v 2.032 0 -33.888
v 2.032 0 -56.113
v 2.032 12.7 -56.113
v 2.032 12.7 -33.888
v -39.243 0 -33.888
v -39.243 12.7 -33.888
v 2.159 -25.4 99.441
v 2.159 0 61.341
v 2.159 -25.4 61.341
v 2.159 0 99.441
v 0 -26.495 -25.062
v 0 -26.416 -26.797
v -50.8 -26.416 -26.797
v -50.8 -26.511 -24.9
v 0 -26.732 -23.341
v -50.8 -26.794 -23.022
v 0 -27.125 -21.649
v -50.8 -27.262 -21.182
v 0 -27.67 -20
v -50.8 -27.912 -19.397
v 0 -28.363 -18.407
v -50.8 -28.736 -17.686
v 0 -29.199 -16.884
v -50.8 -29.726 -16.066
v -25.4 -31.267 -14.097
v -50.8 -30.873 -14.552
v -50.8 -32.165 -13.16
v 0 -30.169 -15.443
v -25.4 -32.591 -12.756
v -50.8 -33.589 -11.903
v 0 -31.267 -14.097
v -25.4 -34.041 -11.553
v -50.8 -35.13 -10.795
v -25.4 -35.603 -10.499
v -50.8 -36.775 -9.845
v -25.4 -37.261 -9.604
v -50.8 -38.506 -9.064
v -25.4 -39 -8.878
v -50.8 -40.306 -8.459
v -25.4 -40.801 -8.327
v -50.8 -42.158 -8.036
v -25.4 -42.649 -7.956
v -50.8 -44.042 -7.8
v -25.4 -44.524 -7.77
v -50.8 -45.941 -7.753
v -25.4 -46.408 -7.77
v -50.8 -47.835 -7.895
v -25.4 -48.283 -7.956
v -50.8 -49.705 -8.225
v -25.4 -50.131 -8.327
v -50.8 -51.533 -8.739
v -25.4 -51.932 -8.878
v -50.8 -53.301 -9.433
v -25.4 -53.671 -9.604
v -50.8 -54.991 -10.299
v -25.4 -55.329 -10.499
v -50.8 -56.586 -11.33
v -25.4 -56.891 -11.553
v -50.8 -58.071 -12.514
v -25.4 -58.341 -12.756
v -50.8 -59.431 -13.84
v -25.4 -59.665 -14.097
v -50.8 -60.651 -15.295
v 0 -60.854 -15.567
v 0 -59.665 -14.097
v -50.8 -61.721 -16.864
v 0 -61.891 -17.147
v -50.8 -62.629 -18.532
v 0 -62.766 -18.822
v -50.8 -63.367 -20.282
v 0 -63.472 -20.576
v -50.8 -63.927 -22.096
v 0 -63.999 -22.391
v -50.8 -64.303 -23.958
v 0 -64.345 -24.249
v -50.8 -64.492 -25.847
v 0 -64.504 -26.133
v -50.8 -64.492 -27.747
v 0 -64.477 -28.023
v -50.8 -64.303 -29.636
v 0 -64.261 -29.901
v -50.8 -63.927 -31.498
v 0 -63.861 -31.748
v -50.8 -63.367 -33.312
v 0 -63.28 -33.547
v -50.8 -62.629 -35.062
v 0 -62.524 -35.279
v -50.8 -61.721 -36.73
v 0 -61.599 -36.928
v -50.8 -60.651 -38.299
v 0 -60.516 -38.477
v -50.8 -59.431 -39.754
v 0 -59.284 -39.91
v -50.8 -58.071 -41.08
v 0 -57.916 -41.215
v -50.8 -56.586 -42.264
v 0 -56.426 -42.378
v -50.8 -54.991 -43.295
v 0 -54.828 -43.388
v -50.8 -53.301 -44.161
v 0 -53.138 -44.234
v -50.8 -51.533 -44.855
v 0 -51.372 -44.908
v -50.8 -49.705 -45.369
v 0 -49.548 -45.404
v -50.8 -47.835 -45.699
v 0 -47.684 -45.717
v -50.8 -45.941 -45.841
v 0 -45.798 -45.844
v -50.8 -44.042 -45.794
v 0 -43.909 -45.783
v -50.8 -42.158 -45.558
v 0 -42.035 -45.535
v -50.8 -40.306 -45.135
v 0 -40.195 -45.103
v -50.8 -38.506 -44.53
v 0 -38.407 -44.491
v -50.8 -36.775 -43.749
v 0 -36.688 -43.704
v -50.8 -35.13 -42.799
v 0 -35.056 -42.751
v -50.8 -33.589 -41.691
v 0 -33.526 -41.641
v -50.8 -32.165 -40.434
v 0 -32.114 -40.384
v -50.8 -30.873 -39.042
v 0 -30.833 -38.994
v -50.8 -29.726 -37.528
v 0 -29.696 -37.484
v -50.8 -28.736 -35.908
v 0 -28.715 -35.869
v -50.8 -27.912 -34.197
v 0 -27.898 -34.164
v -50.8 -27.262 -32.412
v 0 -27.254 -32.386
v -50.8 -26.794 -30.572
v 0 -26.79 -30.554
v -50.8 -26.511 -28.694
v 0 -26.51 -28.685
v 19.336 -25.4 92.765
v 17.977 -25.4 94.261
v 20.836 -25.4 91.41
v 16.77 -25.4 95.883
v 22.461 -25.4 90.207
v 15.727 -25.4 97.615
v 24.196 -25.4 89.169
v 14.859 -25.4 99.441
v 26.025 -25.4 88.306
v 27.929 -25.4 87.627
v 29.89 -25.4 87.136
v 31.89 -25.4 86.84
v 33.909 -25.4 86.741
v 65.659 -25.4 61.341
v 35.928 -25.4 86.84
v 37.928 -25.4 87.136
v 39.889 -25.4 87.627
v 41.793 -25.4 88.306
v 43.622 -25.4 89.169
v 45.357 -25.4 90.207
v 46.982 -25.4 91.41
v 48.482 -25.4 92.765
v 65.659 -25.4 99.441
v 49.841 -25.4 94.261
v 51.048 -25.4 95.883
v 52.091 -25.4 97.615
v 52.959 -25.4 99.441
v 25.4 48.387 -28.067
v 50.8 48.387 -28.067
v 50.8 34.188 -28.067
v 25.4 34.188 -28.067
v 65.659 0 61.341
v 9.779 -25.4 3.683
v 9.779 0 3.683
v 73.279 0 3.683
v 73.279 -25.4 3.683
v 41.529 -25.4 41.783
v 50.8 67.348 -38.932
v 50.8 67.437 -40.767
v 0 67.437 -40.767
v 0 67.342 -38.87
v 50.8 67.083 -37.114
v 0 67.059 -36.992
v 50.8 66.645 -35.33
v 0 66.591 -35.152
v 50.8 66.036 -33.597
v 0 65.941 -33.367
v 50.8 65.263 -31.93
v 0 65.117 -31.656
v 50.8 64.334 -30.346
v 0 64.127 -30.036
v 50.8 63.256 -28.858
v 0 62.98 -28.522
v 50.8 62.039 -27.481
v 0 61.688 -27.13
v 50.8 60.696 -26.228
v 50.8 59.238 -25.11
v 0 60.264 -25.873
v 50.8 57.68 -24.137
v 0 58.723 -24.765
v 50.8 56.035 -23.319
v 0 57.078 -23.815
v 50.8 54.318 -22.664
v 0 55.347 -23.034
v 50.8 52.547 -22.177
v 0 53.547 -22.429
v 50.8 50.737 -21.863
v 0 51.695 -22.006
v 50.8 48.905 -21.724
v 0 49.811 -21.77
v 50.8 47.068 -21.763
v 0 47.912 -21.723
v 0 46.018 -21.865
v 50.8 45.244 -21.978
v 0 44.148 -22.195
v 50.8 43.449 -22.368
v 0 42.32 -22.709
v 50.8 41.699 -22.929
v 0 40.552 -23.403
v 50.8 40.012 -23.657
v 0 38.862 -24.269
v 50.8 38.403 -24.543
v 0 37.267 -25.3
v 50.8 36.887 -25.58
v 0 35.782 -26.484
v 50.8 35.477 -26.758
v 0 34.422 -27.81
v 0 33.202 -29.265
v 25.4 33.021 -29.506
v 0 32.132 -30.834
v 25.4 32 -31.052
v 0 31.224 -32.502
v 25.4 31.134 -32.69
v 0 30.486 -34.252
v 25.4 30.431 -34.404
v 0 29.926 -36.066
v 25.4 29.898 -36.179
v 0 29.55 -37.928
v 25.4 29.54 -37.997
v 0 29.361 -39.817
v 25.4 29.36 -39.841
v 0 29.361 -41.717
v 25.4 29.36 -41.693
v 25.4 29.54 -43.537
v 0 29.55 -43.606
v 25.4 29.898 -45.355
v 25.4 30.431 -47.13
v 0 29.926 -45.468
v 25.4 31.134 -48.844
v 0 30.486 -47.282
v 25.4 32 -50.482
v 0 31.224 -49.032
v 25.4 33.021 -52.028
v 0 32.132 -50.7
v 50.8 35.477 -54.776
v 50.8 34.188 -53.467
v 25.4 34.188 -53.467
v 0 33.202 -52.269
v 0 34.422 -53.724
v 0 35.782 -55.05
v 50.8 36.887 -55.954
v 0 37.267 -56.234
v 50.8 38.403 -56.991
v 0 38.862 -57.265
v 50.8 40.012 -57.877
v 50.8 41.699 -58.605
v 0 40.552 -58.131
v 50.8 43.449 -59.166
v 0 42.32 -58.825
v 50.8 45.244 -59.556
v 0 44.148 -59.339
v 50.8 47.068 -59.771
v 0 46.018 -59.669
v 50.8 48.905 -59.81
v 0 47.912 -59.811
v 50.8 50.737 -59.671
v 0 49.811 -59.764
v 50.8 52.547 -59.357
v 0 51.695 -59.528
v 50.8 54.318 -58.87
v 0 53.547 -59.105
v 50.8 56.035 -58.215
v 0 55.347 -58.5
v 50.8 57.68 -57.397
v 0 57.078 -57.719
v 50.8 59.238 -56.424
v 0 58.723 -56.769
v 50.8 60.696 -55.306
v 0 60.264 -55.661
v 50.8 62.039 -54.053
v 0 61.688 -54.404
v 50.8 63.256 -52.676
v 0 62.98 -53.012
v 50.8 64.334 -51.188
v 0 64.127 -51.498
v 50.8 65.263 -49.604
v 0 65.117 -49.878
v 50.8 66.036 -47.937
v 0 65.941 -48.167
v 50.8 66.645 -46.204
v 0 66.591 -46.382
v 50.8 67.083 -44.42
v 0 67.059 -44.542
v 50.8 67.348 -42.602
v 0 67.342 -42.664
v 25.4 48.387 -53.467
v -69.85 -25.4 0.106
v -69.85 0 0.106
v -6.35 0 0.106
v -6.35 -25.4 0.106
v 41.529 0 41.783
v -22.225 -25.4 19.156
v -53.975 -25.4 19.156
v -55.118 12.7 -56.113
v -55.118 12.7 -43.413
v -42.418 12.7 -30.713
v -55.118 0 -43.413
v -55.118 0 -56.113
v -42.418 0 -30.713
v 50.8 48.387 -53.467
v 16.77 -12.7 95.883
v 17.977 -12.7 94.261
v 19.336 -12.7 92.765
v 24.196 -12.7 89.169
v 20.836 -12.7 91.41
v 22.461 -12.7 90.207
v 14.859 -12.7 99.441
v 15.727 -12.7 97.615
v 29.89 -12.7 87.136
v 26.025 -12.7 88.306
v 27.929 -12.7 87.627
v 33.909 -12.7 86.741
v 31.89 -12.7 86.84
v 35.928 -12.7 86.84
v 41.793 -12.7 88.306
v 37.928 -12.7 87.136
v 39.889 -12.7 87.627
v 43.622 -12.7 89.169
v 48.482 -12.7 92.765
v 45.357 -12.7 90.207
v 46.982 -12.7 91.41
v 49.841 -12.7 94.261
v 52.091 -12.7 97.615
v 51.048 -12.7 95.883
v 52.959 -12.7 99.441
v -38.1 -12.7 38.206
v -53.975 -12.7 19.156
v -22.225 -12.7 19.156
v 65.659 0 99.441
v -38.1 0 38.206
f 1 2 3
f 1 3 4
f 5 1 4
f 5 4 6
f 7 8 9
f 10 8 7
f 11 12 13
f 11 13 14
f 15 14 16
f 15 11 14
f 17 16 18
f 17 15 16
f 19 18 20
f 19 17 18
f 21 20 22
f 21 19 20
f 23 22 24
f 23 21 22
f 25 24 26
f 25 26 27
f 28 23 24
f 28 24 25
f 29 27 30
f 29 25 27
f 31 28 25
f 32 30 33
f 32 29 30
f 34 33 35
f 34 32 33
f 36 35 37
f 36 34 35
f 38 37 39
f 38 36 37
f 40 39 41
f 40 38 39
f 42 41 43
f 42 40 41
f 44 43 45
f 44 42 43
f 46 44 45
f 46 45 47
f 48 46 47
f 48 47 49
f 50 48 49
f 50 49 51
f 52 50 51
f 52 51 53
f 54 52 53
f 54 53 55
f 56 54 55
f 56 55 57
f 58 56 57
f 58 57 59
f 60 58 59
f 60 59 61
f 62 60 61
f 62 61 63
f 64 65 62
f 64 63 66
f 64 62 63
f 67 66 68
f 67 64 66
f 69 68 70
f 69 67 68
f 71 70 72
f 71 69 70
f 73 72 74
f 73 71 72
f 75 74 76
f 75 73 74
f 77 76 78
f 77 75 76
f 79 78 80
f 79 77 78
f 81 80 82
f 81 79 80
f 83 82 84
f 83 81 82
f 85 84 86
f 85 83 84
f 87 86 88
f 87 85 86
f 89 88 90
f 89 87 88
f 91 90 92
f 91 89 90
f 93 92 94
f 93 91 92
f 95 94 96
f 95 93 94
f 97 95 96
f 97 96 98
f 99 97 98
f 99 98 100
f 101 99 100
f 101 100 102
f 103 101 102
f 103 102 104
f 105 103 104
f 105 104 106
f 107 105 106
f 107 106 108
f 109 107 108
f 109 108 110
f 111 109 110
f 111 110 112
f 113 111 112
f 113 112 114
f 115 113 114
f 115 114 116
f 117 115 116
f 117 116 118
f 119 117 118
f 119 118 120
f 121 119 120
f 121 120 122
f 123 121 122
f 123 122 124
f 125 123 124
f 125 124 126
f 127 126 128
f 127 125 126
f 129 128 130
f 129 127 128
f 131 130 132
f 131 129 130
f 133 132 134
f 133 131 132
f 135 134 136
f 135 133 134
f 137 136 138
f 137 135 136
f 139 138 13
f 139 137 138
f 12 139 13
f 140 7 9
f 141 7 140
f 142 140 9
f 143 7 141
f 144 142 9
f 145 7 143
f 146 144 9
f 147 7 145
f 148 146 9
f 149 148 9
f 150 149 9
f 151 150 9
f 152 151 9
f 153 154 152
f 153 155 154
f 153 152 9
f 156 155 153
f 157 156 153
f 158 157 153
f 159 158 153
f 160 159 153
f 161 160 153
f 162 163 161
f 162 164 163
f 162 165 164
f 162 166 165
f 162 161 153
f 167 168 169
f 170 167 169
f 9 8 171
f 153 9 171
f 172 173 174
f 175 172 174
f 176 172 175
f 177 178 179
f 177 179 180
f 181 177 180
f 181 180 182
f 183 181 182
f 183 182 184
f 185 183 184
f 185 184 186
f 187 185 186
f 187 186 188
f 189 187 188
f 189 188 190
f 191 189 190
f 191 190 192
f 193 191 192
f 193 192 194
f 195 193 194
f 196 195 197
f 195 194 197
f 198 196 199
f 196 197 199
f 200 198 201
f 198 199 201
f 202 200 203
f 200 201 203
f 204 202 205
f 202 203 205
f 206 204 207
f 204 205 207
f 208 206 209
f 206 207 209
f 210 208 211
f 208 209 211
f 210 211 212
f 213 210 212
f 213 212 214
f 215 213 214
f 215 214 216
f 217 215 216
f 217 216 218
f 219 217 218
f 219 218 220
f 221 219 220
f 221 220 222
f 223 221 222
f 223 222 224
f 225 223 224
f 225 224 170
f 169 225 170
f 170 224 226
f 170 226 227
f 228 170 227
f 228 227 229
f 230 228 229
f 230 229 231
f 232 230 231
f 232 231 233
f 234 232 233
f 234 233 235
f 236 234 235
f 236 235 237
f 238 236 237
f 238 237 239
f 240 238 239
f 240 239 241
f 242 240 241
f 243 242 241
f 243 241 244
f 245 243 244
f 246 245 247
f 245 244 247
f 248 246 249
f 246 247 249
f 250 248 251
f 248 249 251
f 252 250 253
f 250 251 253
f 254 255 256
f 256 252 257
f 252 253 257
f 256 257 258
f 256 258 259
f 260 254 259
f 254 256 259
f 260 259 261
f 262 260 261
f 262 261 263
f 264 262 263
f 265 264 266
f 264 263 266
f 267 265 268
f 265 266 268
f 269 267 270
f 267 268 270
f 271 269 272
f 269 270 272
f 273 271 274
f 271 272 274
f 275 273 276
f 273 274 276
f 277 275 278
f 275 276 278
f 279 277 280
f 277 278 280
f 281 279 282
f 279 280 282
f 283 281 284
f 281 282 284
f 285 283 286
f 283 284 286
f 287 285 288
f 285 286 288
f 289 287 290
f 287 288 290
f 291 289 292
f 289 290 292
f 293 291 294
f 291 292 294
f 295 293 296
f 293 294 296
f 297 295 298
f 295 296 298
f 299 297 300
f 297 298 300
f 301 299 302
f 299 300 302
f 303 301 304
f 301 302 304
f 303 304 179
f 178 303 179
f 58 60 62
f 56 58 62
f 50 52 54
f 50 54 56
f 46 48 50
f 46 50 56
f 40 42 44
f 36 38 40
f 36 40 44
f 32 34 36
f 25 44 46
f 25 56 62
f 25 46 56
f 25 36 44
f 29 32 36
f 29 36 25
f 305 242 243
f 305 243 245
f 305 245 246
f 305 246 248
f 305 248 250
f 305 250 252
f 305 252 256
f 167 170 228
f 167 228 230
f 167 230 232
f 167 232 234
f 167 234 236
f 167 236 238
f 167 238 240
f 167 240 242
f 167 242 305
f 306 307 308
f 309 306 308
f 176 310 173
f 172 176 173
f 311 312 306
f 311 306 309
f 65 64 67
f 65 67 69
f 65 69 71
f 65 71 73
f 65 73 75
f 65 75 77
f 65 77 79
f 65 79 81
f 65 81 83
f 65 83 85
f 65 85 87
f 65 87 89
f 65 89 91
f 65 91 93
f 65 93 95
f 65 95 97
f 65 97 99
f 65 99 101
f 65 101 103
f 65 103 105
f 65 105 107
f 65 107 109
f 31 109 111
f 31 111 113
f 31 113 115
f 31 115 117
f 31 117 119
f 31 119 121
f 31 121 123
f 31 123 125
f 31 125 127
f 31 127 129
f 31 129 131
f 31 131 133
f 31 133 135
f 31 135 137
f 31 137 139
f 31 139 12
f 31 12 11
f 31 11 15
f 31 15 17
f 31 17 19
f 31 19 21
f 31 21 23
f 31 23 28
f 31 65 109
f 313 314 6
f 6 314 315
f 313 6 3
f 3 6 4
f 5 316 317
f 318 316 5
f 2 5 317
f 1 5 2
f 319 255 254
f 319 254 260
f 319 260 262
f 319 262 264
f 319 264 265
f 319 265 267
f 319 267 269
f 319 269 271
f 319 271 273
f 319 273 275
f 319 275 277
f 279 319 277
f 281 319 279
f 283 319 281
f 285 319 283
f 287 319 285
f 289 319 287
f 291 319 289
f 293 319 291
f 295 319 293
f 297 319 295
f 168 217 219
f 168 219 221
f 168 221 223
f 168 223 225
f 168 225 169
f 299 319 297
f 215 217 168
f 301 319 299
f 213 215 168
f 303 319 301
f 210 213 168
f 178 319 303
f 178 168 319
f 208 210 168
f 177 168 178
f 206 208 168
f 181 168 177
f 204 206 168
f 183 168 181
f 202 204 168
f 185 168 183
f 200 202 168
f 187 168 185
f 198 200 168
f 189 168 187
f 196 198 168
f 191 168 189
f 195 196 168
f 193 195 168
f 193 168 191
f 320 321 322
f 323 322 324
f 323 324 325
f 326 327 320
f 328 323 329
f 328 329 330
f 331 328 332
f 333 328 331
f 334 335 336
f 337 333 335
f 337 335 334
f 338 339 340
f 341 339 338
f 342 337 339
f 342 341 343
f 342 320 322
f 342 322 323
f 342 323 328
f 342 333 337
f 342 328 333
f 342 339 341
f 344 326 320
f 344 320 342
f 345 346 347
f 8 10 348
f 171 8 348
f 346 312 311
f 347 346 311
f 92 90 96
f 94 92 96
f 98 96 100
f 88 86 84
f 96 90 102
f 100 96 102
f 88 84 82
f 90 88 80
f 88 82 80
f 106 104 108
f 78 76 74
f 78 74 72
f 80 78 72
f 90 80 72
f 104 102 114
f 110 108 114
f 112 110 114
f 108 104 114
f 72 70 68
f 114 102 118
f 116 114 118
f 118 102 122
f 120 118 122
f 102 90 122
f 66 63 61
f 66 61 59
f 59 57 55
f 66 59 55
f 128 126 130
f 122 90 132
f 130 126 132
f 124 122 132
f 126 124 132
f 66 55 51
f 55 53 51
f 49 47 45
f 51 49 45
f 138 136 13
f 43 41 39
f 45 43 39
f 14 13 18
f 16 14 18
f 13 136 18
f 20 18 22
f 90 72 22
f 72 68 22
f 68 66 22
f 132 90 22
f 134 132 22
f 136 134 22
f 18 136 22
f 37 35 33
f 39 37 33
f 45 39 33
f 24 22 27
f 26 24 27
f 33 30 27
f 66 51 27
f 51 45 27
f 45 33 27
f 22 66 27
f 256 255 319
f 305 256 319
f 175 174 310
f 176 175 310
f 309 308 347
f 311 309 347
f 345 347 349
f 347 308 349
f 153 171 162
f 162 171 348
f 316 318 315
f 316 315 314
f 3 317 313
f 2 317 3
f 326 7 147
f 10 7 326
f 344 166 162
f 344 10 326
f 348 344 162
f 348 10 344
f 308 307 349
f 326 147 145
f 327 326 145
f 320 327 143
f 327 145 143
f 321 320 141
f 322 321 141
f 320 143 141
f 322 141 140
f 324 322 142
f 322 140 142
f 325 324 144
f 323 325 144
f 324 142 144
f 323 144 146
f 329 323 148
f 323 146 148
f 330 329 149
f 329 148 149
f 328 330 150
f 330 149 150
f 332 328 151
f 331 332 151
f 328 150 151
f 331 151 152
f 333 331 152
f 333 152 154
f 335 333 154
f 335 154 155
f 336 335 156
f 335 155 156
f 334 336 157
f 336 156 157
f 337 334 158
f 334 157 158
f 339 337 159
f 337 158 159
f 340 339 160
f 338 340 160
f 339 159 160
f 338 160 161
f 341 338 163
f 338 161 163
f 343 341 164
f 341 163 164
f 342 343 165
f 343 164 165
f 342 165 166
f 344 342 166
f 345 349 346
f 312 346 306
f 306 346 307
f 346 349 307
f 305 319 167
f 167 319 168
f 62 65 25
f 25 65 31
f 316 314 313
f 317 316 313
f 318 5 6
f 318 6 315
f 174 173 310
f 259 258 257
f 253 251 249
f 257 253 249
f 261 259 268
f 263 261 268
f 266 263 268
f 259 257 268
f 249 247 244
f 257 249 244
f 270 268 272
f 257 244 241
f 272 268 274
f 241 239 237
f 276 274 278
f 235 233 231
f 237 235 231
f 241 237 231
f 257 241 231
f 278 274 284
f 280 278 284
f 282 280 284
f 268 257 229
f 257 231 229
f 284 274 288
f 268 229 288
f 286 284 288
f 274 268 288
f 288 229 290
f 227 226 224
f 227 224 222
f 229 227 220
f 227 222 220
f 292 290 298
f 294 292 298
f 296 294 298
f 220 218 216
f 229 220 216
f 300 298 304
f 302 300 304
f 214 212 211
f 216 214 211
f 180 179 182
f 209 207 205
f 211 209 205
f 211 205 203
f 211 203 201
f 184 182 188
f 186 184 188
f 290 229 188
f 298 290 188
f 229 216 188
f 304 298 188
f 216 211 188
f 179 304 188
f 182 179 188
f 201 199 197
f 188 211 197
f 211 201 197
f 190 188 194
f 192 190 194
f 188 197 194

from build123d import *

# Parameters (mm, degrees)
F1_DEPTH  = 25.4
F3_DEPTH  = 12.7
F5_DEPTH  = 25.4
F6_W      = 31.75
F6_H      = 12.7
F7_DEPTH  = 12.7
F8_R      = 19.05
F9_DEPTH  = 50.8
F11_DEPTH = 25.4
F12_R     = 19.05
F13_DEPTH = 50.8
F15_DEPTH = 25.4
F16_W     = 63.5
F16_H     = 38.1000004709
F17_DEPTH = 25.4
F19_DEPTH = 12.7


with BuildPart() as f1:
    # F0 (on Front) → F1 (new body)
    with BuildSketch(Plane.XZ):
        Polygon((-38.1, 38.2058574115), (-69.85, 0.1058574115), (-6.35, 0.1058574115), align=None)
    extrude(amount=F1_DEPTH)

    # F2 (on face) → F3 (cut)
    with BuildSketch(Plane.XZ.offset(25.4)):
        Polygon((-53.975, 19.1558574115), (-38.1, 19.1558574115), (-22.225, 19.1558574115), (-38.1, 38.2058574115), align=None)
    extrude(amount=-F3_DEPTH, mode=Mode.SUBTRACT)


with BuildPart() as f5:
    # F4 (on Front) → F5 (new body)
    with BuildSketch(Plane.XZ):
        Polygon((25.6539984085, 22.7330001045), (9.7789984085, 3.6830001045), (73.2789984085, 3.6830001045), (57.4039984085, 22.7330001045), (41.5289984085, 22.7330001045), align=None)
        Polygon((41.5289984085, 41.7830001045), (25.6539984085, 22.7330001045), (41.5289984085, 22.7330001045), (57.4039984085, 22.7330001045), align=None)
    extrude(amount=F5_DEPTH)


with BuildPart() as f7:
    # F6 (on Front) → F7 (new body)
    with BuildSketch(Plane.XZ):
        Polygon((-39.2430012196, -33.8879922846), (-29.7180012196, -43.4129922846), (2.0319987804, -43.4129922846), (2.0319987804, -33.8879922846), align=None)
        with Locations((-13.8430012196, -49.7629922846)):
            Rectangle(F6_W, F6_H)
        Polygon((-55.1180012196, -43.4129922846), (-55.1180012196, -56.1129922846), (-29.7180012196, -56.1129922846), (-29.7180012196, -43.4129922846), (-39.2430012196, -33.8879922846), (-42.4180012196, -30.7129922846), align=None)
    extrude(amount=-F7_DEPTH)


with BuildPart() as f9:
    # F8 (on Right) → F9 (new body)
    with BuildSketch(Plane.YZ):
        with Locations((-45.4660002142, -26.7969986916)):
            Circle(F8_R)
    extrude(amount=-F9_DEPTH)

    # F10 (on face) → F11 (cut)
    with BuildSketch(Plane.YZ):
        with BuildLine():
            Line((-59.6650318713, -14.0969986916), (-45.4660002142, -14.0969986916))
            Line((-45.4660002142, -14.0969986916), (-31.2669685571, -14.0969986916))
            ThreePointArc((-31.2669685571, -14.0969986916), (-45.4660002142, -7.7469986916), (-59.6650318713, -14.0969986916))
        make_face()
    extrude(amount=-F11_DEPTH, mode=Mode.SUBTRACT)


with BuildPart() as f13:
    # F12 (on Right) → F13 (new body)
    with BuildSketch(Plane.YZ):
        with Locations((48.3870003372, -40.7670012236)):
            Circle(F12_R)
    extrude(amount=F13_DEPTH)

    # F14 (on face) → F15 (cut)
    with BuildSketch(Plane.YZ.offset(50.8)):
        with BuildLine():
            Line((48.3870003372, -53.4670012236), (48.3870003372, -40.7670012236))
            Line((48.3870003372, -40.7670012236), (48.3870003372, -28.0670012236))
            Line((48.3870003372, -28.0670012236), (34.1879686801, -28.0670012236))
            ThreePointArc((34.1879686801, -28.0670012236), (29.3370003372, -40.7670012236), (34.1879686801, -53.4670012236))
            Line((34.1879686801, -53.4670012236), (48.3870003372, -53.4670012236))
        make_face()
    extrude(amount=-F15_DEPTH, mode=Mode.SUBTRACT)


with BuildPart() as f17:
    # F16 (on Front) → F17 (new body)
    with BuildSketch(Plane.XZ):
        with Locations((33.9089920744, 80.3909990937)):
            Rectangle(F16_W, F16_H)
    extrude(amount=F17_DEPTH)

    # F18 (on face) → F19 (cut)
    with BuildSketch(Plane.XZ.offset(25.4)):
        with BuildLine():
            Line((52.9589920744, 99.4409993291), (14.8589920744, 99.4409993291))
            ThreePointArc((14.8589920744, 99.4409993291), (33.9089920744, 86.7409988582), (52.9589920744, 99.4409993291))
        make_face()
    extrude(amount=-F19_DEPTH, mode=Mode.SUBTRACT)


solid = Compound([f1.part, f5.part, f7.part, f9.part, f13.part, f17.part])
